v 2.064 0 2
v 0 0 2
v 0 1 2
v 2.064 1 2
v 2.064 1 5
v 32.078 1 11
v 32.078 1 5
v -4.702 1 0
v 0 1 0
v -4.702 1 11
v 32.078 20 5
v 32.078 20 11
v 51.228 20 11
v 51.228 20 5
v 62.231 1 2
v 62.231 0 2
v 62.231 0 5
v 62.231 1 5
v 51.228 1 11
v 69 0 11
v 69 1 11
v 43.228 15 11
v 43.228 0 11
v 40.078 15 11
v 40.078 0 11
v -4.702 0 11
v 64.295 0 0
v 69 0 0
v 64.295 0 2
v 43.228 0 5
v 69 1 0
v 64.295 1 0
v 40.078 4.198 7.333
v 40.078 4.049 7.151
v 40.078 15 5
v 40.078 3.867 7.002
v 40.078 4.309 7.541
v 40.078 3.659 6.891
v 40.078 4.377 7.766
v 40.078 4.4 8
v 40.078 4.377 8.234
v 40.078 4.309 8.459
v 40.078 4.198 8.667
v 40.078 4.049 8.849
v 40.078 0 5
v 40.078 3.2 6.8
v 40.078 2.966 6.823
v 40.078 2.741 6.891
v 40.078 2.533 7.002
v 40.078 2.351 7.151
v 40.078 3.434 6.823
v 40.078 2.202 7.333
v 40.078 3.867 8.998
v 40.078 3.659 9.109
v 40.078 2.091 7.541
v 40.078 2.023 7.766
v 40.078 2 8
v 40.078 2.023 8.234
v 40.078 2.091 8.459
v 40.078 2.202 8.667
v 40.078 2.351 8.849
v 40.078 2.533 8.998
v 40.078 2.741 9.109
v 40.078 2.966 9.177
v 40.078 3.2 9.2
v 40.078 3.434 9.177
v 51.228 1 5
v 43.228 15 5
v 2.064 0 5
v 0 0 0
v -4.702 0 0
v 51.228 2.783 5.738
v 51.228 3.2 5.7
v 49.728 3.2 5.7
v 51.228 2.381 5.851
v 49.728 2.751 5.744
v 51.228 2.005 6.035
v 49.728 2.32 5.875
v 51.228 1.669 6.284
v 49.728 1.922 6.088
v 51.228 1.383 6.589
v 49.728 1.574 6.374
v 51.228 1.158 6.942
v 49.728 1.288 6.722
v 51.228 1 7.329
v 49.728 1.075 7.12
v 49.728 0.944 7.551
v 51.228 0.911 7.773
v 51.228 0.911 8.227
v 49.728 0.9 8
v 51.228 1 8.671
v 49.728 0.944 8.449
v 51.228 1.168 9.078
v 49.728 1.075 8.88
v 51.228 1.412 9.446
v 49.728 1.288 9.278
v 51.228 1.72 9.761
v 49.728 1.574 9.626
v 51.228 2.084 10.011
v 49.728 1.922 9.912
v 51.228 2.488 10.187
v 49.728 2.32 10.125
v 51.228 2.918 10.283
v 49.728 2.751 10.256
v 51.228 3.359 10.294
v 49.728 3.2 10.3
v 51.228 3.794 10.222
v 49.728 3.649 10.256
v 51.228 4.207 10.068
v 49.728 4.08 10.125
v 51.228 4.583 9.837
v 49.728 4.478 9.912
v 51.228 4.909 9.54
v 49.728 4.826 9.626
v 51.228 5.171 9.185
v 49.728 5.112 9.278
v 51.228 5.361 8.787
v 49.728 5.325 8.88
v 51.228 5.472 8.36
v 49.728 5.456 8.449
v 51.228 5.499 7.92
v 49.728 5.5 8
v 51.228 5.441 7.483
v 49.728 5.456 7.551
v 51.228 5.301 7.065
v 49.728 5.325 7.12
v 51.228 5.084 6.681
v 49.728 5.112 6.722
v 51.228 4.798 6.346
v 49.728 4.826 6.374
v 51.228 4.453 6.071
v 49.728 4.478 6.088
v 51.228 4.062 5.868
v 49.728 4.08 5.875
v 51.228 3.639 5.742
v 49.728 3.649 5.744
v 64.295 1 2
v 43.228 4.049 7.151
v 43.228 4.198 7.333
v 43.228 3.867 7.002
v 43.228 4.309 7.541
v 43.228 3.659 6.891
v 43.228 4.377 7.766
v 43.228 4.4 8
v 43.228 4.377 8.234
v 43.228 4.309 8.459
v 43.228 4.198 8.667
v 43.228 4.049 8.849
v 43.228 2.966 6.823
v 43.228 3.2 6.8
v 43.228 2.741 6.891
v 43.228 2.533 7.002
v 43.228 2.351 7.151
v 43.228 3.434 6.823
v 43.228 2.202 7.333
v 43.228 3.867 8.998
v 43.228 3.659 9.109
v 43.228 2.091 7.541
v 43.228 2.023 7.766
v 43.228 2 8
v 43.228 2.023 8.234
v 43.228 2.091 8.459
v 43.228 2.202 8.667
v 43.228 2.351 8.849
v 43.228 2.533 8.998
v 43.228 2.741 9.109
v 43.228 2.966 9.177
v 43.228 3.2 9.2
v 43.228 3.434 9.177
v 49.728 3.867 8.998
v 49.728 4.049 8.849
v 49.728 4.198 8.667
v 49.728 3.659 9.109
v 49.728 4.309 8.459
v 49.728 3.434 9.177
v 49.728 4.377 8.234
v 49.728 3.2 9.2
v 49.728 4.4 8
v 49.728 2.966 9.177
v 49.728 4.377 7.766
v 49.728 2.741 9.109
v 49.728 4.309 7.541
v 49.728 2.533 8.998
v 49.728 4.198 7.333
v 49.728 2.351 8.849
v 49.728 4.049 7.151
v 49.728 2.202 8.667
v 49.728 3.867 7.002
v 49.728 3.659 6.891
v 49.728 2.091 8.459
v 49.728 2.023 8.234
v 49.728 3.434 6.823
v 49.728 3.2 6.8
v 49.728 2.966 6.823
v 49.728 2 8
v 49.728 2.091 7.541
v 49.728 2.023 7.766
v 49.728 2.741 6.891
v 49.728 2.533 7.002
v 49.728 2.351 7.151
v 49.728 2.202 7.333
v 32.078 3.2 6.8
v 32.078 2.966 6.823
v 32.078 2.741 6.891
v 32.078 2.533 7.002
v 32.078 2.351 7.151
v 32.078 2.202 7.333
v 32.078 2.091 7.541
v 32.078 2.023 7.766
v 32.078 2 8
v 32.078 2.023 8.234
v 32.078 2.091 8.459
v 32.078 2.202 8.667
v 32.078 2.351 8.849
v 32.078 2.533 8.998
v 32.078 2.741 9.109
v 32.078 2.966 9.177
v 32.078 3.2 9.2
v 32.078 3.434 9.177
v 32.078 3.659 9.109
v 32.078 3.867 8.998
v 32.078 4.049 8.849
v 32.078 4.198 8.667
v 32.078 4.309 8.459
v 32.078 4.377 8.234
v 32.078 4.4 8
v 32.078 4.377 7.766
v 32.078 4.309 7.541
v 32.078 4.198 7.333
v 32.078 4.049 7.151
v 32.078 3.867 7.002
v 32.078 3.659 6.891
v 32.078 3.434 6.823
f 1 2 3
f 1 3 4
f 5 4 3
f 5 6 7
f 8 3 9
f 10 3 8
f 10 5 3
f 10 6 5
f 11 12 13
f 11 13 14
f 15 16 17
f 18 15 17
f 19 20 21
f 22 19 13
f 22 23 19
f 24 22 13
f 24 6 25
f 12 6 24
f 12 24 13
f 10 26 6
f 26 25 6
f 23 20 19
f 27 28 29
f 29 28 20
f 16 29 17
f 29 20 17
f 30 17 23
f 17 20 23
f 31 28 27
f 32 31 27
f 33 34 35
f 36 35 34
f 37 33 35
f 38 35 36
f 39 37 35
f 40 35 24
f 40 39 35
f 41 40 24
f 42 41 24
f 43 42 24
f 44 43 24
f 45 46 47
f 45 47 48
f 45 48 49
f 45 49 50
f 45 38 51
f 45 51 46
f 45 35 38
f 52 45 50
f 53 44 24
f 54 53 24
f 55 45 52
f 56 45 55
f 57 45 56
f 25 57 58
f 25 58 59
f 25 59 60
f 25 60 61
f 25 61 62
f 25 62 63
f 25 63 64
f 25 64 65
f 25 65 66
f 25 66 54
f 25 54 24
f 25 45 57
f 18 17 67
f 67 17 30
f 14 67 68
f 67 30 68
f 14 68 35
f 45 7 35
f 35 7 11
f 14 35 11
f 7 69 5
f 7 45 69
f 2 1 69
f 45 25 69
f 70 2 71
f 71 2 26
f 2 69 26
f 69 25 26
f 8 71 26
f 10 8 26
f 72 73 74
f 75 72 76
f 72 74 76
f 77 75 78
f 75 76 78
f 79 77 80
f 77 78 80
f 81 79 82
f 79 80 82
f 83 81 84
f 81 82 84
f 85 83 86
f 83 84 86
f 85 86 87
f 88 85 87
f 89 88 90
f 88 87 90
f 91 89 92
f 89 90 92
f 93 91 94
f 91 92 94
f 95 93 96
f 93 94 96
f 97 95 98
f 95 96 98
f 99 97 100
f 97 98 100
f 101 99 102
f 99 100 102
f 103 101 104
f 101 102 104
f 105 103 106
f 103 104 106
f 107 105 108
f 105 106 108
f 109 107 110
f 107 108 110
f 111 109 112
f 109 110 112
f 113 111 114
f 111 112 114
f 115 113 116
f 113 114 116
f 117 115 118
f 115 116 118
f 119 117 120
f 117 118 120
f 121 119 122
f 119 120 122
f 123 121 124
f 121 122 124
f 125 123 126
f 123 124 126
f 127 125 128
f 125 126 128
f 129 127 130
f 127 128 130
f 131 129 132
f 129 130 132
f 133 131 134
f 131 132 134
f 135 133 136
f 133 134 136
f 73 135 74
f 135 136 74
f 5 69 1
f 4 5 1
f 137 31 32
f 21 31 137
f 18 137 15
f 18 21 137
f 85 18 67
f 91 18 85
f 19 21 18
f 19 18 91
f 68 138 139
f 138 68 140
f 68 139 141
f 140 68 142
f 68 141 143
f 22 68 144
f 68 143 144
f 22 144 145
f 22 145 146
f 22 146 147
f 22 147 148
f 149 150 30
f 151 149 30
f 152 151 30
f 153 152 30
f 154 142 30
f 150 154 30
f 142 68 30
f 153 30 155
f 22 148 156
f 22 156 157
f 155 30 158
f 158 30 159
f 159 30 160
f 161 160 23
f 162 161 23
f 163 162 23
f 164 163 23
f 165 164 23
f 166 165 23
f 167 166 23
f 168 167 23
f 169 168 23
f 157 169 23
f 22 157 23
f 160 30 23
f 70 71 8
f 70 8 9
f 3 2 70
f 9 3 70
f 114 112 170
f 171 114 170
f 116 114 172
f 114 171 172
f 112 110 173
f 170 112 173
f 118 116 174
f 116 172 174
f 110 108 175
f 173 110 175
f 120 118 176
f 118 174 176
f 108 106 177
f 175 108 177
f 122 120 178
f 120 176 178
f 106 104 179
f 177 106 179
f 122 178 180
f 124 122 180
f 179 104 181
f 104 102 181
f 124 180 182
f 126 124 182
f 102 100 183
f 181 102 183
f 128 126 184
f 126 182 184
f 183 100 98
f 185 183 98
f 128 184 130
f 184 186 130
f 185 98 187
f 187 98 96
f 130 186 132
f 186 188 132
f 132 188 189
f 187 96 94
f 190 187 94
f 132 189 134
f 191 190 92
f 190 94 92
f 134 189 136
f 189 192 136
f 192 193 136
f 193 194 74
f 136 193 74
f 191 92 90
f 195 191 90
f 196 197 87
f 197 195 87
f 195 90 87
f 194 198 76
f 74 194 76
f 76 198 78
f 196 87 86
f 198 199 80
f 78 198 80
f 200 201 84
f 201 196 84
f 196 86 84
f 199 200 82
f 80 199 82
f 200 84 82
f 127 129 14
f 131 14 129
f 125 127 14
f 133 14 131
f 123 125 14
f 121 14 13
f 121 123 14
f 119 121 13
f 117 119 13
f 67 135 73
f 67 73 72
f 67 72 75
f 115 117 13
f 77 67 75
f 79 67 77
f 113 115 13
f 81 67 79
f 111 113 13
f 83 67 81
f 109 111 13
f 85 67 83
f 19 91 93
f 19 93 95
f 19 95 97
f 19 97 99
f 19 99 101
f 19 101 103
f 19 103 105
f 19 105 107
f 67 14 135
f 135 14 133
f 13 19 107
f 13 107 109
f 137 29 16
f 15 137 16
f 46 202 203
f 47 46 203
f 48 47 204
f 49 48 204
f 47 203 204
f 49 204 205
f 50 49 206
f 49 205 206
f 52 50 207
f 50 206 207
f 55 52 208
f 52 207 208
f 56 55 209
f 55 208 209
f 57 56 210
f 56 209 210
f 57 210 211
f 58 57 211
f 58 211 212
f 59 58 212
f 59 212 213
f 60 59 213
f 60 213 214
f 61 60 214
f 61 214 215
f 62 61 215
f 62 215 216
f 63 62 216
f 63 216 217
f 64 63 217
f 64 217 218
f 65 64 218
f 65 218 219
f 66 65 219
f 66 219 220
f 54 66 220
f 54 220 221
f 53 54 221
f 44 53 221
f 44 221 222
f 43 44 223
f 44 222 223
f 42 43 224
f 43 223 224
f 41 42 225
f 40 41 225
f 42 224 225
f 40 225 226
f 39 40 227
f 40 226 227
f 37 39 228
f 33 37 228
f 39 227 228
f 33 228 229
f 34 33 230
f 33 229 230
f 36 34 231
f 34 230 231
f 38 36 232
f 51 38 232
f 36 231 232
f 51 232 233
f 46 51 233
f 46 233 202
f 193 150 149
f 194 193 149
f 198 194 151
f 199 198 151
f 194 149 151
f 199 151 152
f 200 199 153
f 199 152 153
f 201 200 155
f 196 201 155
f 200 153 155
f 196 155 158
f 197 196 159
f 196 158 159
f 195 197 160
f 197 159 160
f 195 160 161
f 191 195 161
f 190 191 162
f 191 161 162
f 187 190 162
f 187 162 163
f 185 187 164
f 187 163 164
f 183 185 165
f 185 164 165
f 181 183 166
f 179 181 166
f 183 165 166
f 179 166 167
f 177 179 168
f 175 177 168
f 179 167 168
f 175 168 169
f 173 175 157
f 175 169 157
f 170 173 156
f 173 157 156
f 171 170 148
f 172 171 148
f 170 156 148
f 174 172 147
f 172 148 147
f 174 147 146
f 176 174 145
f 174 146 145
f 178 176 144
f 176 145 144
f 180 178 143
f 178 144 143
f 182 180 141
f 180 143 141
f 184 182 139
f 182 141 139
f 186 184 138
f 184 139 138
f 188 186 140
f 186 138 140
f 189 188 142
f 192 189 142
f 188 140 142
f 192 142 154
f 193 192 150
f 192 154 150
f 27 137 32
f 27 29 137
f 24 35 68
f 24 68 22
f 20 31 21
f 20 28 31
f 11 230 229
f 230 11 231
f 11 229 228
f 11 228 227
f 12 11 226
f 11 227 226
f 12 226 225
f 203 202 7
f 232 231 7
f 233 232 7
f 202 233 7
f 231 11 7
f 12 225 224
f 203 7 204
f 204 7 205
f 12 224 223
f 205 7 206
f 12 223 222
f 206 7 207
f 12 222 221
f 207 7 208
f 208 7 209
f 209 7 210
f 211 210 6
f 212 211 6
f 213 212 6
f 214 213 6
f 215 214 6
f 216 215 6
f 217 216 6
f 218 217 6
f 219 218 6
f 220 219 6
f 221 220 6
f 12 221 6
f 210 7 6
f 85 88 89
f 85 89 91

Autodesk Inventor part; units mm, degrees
ref_plane "YZ Plane" through (0, 0, 0) normal (1, 0, 0) x (0, 1, 0)
ref_plane "XZ Plane" through (0, 0, 0) normal (0, 1, 0) x (-1, 0, 0)
ref_plane "XY Plane" through (0, 0, 0) normal (0, 0, 1) x (1, 0, 0)
sketch "Sketch1" plane through (0, 0, 0) normal (0, 1, 0) x (-1, 0, 0)
  line L0 (-62.1475, 5) -> (-62.1475, 11)
  line L1 (-62.1475, 11) -> (-2.0643, 11)
  line L2 (-2.0643, 5) -> (-2.0643, 11)
  line L3 (-2.0643, 11) -> (-62.1475, 11)
  line L4 (-2.0643, 5) -> (-62.1475, 5)
  line L5 (-4.3424, 5) -> (-59.9525, 5)
  line L6 (-62.1475, 11) -> (-2.0643, 11)
  line L7 (-43.2275, 5) -> (-43.2275, 11)
  line L8 (-40.0775, 5) -> (-40.0775, 11)
  line L9 (-62.2307, 5) -> (-2.0643, 5)
  line L10 (-32.0775, 5) -> (-32.0775, 11)
  line L11 (-51.2275, 5) -> (-51.2275, 11)
  point P0 (0, 0)
  dimension "d0" = 18.92
  dimension "d1" = 3.15
  dimension "d2" = 8
  dimension "d3" = 8
extrude "Extrusion1" add sketch "Sketch1" along normal blind 20 contours L1 L7 L4 L11 | L1 L10 L4 L8
sketch "Sketch2" plane through (0, 0, 0) normal (0, 1, 0) x (-1, 0, 0)
  line L0 (4.7021, 0) -> (4.7021, 5)
  line L1 (4.7021, 0) -> (4.7021, 11)
  line L2 (-32.0775, 11) -> (4.7021, 11)
  line L3 (4.7021, 11) -> (-32.0775, 11)
  line L4 (-32.0775, 11) -> (-32.0775, 5)
  line L5 (-4.3424, 5) -> (-2.0643, 5)
  line L6 (-32.0775, 5) -> (-2.0643, 5)
  line L7 (-2.0643, 5) -> (-2.0643, 2)
  line L8 (0, 2) -> (-2.0643, 2)
  line L9 (-2.0643, 2) -> (0, 2)
  line L10 (0, 2) -> (0, 0)
  line L11 (4.7021, 0) -> (0, 0)
  line L12 (0, 0) -> (4.7021, 0)
  line L13 (-51.2275, 5) -> (-51.2275, 11)
  line L14 (-51.2275, 5) -> (-51.2275, 11)
  line L15 (-69.0002, 11) -> (-51.2275, 11)
  line L16 (-51.2275, 11) -> (-69.0002, 11)
  line L17 (-69.0002, 0) -> (-69.0002, 5)
  line L18 (-69.0002, 11) -> (-69.0002, 0)
  line L19 (4.7021, 0) -> (0, 0)
  line L20 (-69.0002, 0) -> (-64.295, 0)
  line L21 (-64.295, 0) -> (-64.295, 1.7012)
  line L22 (0, 2) -> (-2.0643, 2)
  line L23 (-2.0643, 2) -> (-2.0643, 5)
  line L24 (-62.2307, 2) -> (-62.2307, 5)
  line L25 (-62.2307, 5) -> (-51.2275, 5)
  line L26 (-64.295, 2) -> (-62.2307, 2)
  line L27 (-64.295, 2) -> (-64.295, 1.7012)
  point P0 (-68.997, 0)
extrude "Extrusion2" add sketch "Sketch2" along normal blind 1
sketch "Sketch3" plane through (40.0775, 0, 11) normal (1, 0, 0) x (0, 0, -1)
  line L0 (6, 1) -> (6, 20) projected
  line L1 (6, 20) -> (6, 15)
  line L2 (6, 15) -> (0, 15)
  line L3 (0, 1) -> (0, 20) projected
  line L4 (0, 20) -> (6, 20)
  point P0 (11, 0)
  dimension "d8" = 5
extrude "Extrusion3" add sketch "Sketch3" along normal blind 5.5
sketch "Sketch4" plane through (51.2275, 20, 11) normal (1, 0, 0) x (0, 0, -1)
  line L0 (6, -19) -> (6, 0) projected
  line L1 (0, -19) -> (0, 0) projected
  circle A0 centre (3, -16.8) radius 0.9682
  line L2 (0, -19) -> (11, -19) projected
  point P0 (11, -20)
  dimension "d11" = 6
  dimension "d12" = 3
  dimension "d13" = 2.2
hole "Hole1" at (51.2275, 3.2, 8) direction (-1, 0, 0) diameter 2.4 depth 24 tip angle 118 counterbore diameter 4.6 counterbore depth 1.5
properties part number "screw_supp"
